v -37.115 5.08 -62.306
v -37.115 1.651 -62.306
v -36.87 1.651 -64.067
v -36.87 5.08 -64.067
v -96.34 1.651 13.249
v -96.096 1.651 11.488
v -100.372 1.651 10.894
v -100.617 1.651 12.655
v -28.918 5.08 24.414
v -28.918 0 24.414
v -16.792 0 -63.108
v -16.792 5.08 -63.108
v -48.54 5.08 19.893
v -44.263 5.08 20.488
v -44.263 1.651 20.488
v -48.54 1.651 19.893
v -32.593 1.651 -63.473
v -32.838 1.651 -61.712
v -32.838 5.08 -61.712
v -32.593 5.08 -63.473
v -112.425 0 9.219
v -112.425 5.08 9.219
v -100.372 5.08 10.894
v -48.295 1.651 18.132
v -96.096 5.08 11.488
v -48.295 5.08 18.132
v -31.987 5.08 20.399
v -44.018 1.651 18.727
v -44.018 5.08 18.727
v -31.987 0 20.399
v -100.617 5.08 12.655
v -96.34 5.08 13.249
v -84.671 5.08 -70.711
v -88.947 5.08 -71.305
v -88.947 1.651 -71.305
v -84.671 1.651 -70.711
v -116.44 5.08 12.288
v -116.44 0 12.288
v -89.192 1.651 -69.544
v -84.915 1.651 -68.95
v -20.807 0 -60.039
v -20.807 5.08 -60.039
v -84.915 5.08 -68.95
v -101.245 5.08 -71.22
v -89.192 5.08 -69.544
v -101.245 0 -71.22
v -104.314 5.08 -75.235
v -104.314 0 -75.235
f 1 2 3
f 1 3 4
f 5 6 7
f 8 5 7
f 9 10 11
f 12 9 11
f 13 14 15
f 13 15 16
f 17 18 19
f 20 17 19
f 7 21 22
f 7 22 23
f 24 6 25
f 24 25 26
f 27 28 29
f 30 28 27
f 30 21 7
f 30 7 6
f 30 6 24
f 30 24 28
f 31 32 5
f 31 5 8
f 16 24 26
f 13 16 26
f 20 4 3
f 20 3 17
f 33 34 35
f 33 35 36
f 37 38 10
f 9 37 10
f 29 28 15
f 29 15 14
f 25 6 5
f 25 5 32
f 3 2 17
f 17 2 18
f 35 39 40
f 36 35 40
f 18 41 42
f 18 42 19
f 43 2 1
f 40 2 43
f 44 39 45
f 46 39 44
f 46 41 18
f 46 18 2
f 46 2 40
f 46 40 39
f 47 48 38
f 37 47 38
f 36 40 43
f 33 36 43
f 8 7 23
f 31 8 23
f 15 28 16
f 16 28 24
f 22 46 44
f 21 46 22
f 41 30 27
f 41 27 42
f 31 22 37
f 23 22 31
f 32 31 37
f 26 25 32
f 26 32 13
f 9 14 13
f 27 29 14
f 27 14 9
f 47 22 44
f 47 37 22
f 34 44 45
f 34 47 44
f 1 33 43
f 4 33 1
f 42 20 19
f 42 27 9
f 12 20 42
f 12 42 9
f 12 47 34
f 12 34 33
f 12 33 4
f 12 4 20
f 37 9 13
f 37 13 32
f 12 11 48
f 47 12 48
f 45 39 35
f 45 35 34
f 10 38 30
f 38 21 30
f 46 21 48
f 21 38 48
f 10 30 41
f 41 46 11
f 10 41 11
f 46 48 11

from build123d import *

# Parameters (mm, degrees)
BOSS_EXTRUDE1_DEPTH = 5.08
SKETCH9_W           = 4.318
SKETCH9_H           = 4.318
CUT_EXTRUDE3_DEPTH  = 1.778
SKETCH10_W          = 4.318
SKETCH10_H          = 4.318
CUT_EXTRUDE4_DEPTH  = 1.778
SKETCH11_W          = 4.318
SKETCH11_H          = 4.318
CUT_EXTRUDE5_DEPTH  = 1.778
SKETCH12_W          = 4.318
SKETCH12_H          = 4.318
CUT_EXTRUDE6_DEPTH  = 1.778


with BuildPart() as part:
    # Sketch1 → Boss-Extrude1 (new body)
    with BuildSketch(Plane(origin=(0, 0, 0), x_dir=(1, 0, 0), z_dir=(0, 1, 0))):
        Polygon((-28.91784315, -24.413806508), (-16.791726333, 63.108386813), (-104.313919654, 75.23450363), (-116.440036471, -12.287689691), align=None)
        Polygon((-20.806654289, 60.039384261), (-101.244917102, 71.219575674), (-112.425108515, -9.218687139), (-31.986845702, -20.398878552), align=None, mode=Mode.SUBTRACT)
    extrude(amount=BOSS_EXTRUDE1_DEPTH)

    # Sketch9 → Cut-Extrude3 (cut)
    with BuildSketch(Plane(origin=(-3.387750967, 0, 24.3738942), x_dir=(-0.9904784923139263, 0, -0.13766755704788136), z_dir=(0.13766755704788133, 0, -0.9904784923139262))):
        with Locations((43.18, 3.81)):
            Rectangle(SKETCH9_W, SKETCH9_H)
    extrude(amount=-CUT_EXTRUDE3_DEPTH, mode=Mode.SUBTRACT)

    # Sketch10 → Cut-Extrude4 (cut)
    with BuildSketch(Plane(origin=(7.792440446, 0, -56.064368613), x_dir=(0.9904784923139262, 0, 0.1376675570478817), z_dir=(-0.1376675570478817, 0, 0.9904784923139263))):
        with Locations((-43.18, 3.81)):
            Rectangle(SKETCH10_W, SKETCH10_H)
    extrude(amount=-CUT_EXTRUDE4_DEPTH, mode=Mode.SUBTRACT)

    # Sketch11 → Cut-Extrude5 (cut)
    with BuildSketch(Plane(origin=(7.792440446, 0, -56.064368613), x_dir=(0.9904784923139262, 0, 0.1376675570478817), z_dir=(-0.1376675570478817, 0, 0.9904784923139263))):
        with Locations((-95.758, 3.81)):
            Rectangle(SKETCH11_W, SKETCH11_H)
    extrude(amount=-CUT_EXTRUDE5_DEPTH, mode=Mode.SUBTRACT)

    # Sketch12 → Cut-Extrude6 (cut)
    with BuildSketch(Plane(origin=(-3.387750967, 0, 24.3738942), x_dir=(-0.9904784923139263, 0, -0.13766755704788136), z_dir=(0.13766755704788133, 0, -0.9904784923139262))):
        with Locations((95.758, 3.81)):
            Rectangle(SKETCH12_W, SKETCH12_H)
    extrude(amount=-CUT_EXTRUDE6_DEPTH, mode=Mode.SUBTRACT)


solid = part.part
